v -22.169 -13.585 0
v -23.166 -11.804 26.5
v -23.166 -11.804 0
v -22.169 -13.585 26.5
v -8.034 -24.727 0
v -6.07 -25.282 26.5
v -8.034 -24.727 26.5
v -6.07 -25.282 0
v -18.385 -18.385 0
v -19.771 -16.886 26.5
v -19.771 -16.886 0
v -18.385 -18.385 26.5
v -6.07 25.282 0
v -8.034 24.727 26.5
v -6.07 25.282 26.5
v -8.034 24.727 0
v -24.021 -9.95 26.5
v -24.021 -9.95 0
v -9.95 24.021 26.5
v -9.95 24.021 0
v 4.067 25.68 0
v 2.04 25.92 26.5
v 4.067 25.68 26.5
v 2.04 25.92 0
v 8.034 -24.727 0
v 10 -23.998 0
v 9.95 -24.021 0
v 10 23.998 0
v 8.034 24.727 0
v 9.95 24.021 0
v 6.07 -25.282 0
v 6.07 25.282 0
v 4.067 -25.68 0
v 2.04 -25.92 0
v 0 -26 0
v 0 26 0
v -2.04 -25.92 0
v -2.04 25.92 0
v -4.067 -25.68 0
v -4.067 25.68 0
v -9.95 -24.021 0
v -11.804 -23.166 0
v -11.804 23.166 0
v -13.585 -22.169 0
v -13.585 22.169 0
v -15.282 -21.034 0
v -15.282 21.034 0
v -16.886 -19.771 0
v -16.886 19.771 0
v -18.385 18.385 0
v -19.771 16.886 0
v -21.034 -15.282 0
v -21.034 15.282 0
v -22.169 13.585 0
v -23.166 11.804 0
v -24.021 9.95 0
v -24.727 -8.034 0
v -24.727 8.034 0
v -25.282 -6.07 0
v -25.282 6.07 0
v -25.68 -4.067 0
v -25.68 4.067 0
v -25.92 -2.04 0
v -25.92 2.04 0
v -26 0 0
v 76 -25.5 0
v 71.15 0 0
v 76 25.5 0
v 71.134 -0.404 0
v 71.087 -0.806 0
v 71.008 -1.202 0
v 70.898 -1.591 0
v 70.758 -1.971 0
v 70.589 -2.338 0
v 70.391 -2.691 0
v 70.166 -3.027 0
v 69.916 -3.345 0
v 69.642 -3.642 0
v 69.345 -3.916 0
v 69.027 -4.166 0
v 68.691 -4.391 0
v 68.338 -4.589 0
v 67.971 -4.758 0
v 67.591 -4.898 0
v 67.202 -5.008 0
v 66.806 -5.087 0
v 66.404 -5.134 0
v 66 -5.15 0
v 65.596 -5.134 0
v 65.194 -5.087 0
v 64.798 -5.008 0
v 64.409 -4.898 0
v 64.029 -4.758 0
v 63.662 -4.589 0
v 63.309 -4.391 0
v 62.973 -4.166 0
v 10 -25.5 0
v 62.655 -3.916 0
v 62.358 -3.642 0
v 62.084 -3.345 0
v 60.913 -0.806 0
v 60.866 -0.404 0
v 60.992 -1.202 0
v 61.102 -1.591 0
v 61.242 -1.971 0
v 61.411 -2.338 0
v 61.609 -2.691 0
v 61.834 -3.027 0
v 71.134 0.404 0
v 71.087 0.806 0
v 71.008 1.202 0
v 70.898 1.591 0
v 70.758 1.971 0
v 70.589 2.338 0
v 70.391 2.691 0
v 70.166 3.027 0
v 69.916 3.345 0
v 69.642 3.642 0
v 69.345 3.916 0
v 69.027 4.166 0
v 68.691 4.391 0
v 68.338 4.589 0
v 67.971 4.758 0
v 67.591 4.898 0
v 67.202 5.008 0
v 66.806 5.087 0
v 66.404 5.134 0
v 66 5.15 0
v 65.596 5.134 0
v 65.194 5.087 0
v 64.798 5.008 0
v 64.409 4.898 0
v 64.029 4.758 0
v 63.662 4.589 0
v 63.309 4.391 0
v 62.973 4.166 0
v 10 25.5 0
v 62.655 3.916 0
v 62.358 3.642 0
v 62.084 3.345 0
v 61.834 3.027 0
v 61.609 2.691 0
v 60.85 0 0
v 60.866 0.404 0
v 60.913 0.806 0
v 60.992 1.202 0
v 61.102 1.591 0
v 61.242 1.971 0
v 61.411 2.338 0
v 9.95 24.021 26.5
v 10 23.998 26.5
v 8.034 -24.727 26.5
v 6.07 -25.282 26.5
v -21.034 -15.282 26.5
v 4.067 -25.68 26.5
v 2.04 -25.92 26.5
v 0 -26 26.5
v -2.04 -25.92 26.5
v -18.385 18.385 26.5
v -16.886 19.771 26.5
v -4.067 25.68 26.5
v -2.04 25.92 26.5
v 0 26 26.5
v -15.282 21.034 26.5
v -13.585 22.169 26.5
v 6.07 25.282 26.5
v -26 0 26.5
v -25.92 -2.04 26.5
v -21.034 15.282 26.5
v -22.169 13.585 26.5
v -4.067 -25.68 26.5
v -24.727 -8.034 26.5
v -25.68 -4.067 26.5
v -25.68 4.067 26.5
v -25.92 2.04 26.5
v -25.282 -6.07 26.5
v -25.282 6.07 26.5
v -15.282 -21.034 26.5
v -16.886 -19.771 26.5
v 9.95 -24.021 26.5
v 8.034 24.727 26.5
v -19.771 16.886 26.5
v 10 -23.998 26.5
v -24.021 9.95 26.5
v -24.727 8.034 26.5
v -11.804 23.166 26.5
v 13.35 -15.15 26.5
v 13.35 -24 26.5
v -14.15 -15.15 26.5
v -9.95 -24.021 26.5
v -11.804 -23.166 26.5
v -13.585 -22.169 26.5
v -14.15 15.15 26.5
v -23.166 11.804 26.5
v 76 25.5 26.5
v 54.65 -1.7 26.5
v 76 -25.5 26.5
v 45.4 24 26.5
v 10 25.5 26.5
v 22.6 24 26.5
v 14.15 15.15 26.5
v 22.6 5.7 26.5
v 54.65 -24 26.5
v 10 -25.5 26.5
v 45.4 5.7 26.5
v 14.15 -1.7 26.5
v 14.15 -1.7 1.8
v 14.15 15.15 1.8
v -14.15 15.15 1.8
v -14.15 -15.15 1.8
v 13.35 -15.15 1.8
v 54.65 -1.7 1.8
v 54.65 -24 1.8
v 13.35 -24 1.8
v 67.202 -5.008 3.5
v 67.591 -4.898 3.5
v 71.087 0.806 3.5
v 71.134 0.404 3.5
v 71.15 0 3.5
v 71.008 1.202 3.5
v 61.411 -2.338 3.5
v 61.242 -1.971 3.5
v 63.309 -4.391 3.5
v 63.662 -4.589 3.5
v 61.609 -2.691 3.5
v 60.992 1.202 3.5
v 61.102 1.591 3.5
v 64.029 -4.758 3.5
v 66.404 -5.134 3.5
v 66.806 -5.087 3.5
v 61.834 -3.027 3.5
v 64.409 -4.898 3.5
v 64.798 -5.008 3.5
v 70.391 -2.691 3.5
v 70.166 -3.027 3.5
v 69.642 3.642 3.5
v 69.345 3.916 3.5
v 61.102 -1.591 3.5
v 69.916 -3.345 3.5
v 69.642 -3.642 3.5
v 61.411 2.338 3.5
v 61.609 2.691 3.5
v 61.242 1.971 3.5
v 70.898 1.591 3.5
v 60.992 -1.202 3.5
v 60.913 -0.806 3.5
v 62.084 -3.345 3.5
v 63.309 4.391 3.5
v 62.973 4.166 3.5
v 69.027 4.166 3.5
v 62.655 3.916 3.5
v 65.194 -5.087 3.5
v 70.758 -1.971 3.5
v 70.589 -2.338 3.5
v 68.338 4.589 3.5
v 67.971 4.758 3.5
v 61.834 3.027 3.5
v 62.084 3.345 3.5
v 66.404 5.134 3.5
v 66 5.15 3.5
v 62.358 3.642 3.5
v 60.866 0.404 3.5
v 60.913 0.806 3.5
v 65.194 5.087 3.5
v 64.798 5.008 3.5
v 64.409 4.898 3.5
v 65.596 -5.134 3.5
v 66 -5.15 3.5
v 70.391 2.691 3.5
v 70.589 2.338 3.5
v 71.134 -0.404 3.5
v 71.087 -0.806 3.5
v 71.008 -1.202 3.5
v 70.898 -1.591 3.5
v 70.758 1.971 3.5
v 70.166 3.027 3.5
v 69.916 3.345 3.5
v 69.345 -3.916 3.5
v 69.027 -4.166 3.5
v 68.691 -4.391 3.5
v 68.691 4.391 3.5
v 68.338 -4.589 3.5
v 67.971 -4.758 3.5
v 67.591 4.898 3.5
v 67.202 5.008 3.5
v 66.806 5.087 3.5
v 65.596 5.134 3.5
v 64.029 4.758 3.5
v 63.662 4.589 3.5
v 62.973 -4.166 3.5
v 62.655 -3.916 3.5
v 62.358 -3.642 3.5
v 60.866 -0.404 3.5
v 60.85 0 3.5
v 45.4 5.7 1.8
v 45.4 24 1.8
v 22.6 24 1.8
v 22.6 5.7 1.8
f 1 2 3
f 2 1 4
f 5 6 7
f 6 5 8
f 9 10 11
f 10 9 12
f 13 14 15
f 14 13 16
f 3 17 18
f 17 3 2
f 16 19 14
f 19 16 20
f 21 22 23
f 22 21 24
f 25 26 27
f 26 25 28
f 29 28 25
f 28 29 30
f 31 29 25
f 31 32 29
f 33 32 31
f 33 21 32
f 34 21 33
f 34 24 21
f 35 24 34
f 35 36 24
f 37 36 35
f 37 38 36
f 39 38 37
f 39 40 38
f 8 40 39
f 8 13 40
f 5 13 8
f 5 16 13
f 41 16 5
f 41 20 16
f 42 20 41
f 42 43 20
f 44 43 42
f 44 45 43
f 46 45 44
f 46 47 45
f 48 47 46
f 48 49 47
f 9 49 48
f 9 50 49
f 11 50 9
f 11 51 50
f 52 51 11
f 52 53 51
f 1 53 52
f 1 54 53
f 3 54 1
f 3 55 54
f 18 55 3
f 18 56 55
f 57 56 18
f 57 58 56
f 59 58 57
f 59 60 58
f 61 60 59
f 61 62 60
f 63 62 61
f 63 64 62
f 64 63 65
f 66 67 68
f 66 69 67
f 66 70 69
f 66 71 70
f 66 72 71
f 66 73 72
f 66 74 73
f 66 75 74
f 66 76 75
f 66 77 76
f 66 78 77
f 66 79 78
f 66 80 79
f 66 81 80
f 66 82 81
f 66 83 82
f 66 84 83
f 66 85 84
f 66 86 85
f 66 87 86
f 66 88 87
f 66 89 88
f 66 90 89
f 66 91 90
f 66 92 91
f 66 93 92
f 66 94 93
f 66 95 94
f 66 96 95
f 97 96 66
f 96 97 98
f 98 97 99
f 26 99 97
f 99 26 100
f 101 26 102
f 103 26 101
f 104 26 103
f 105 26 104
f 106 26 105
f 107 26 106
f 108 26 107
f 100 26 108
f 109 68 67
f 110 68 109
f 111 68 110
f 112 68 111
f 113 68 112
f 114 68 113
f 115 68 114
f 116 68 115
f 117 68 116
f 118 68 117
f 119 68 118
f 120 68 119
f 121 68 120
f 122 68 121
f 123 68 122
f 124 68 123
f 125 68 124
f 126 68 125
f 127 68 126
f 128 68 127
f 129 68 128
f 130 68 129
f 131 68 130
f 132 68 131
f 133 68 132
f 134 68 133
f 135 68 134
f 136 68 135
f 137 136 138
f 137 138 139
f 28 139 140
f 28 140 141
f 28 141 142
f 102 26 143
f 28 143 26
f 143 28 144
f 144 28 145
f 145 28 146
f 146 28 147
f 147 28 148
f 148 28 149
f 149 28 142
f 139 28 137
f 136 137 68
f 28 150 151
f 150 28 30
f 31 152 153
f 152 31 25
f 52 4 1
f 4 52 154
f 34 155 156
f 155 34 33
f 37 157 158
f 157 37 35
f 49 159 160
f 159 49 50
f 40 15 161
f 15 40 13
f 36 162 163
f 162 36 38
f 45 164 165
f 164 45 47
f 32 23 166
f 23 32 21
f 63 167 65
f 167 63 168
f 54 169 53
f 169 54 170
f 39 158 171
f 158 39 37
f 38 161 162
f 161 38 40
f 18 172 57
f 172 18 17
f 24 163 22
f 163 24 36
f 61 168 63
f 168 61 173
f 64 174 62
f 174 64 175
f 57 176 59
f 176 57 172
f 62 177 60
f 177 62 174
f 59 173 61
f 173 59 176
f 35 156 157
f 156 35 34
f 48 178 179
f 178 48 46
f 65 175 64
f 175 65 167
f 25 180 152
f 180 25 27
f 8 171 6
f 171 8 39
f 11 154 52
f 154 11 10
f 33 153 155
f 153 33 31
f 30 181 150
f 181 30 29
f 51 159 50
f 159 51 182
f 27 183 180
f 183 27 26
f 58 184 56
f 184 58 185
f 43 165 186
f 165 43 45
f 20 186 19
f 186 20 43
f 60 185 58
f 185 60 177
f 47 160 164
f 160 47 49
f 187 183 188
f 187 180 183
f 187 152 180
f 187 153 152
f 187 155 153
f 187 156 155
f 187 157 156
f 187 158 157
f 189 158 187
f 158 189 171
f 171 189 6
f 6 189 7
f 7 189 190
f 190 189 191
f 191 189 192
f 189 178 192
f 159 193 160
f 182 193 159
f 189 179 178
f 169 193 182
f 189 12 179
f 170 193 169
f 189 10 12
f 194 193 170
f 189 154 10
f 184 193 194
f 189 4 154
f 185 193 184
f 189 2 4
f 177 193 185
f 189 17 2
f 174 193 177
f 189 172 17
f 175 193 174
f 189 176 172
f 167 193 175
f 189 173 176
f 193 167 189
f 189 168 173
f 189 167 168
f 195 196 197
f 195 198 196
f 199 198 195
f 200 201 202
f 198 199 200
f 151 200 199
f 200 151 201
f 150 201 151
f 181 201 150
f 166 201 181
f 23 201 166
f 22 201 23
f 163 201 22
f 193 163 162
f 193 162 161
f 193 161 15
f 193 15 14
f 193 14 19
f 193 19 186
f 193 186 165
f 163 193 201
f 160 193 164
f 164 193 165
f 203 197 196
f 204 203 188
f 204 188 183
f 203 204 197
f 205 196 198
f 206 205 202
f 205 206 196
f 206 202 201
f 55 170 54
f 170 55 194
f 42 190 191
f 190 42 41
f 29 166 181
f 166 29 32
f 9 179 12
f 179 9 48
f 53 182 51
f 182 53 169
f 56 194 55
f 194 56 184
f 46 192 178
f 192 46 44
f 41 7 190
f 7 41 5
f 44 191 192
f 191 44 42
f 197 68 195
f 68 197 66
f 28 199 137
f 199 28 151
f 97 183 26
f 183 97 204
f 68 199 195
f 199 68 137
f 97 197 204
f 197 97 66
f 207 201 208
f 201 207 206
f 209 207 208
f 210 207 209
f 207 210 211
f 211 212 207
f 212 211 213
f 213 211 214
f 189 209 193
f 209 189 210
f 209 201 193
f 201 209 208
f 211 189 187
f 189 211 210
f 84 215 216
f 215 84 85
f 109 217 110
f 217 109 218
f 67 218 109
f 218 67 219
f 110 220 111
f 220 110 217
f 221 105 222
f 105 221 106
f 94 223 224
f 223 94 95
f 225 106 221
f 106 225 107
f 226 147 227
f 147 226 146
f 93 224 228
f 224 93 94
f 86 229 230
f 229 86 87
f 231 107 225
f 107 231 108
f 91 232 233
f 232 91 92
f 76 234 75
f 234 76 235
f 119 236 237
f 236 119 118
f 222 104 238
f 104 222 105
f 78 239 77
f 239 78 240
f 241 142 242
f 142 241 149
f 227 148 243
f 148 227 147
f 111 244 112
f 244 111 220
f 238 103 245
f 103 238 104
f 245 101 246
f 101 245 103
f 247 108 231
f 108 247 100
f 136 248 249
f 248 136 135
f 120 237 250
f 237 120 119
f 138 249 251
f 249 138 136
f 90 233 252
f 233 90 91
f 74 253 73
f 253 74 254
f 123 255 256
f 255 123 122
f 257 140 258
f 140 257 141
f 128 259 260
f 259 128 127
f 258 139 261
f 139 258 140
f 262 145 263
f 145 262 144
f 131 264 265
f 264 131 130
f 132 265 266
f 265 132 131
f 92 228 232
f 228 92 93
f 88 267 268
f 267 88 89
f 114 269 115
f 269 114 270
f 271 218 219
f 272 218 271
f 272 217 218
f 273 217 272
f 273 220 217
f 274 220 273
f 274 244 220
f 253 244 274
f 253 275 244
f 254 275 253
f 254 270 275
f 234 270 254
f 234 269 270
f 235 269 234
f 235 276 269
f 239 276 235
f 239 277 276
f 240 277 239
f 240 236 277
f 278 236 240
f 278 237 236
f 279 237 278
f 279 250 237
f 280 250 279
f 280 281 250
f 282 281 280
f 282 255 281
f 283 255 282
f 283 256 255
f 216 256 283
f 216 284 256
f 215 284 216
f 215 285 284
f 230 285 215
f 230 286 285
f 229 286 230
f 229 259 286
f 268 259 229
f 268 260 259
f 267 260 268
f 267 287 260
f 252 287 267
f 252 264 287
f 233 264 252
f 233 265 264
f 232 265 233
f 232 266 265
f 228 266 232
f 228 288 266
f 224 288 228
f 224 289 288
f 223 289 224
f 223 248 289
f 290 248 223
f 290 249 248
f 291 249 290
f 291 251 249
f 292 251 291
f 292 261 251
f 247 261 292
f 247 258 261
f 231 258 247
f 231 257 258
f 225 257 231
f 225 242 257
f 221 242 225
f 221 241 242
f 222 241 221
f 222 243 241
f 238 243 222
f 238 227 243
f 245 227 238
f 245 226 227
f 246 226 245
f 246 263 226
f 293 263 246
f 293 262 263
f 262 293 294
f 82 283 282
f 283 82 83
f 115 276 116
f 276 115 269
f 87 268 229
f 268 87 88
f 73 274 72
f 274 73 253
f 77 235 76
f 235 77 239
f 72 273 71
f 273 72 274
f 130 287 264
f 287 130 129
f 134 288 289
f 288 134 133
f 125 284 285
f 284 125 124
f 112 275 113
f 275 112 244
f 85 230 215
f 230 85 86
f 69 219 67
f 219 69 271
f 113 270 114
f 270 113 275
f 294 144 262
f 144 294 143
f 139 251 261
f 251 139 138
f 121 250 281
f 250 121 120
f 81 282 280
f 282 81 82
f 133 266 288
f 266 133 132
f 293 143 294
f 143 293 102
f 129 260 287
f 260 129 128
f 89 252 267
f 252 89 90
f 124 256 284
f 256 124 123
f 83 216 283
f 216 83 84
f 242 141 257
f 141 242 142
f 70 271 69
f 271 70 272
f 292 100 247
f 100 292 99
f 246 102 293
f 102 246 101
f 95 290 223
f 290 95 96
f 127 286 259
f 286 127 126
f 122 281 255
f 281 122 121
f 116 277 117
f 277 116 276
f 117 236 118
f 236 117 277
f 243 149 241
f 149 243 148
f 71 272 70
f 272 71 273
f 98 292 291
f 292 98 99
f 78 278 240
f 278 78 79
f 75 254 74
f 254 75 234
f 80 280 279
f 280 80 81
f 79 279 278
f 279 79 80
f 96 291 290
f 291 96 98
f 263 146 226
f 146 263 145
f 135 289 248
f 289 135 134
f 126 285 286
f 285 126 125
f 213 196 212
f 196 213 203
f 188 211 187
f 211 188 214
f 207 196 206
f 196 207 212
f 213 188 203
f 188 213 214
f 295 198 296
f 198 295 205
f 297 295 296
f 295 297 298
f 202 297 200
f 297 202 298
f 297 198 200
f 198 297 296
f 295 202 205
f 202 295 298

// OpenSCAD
// ============================================================
//  Wrist-Puck Keyhole Enclosure — First Draft
//  Rev 1.0  |  July 2026  |  Sean (Whitehorse, YT)
//
//  Replaces the circular puck (wrist_puck_enclosure_5_0.scad) with
//  a keyhole silhouette: a round chamber (servo + arm + LRA) joined
//  to an elongated rectangular body (battery/DRV/PowerBoost stack +
//  XIAO/IMU stack), sized against Sean's actual wrist (53mm wide x
//  35mm thick where the watch sits) rather than a fixed diameter
//  that didn't fit.
//
//  Component numbers below are Sean's own measurements from this
//  session, not the earlier file's assumed values -- several
//  changed (battery is 9mm thick now, not 6mm; servo+arm sweep is
//  28x30mm, not just the 21.5x25.1mm body; PowerBoost/XIAO/IMU all
//  slightly different from the rev5 assumptions). Reused without
//  change: WALL, FLOOR_T, LID_T, CLEARANCE, CAP_T, SNAP_* from
//  wrist_puck_enclosure_5_0.scad -- no reason to re-derive numbers
//  that were already validated there.
//
//  FIRST-PASS FLAGS -- explicit, not buried in comments:
//    - RECT_W (51mm) against Sean's 53mm wrist width leaves only
//      ~1mm clearance per side. That's tight. A real dry-fit is not
//      optional here the way it was borderline-optional elsewhere.
//    - Servo pocket fits chamber inner radius with ~1mm margin --
//      also tight. If the actual arm sweep needs clearance beyond
//      the bounding rectangle, this will need revisiting.
//    - LRA position is a placement guess, not derived from a known
//      arm-sweep direction -- flagged in-line below.
//    - No snap tabs, USB-C cutout, or standoff posts yet -- this
//      draft establishes the outer silhouette and the two internal
//      cavities are load-bearing; those details are next-pass.
//    - No lid/cap yet -- bottom shell only, to get the harder shape
//      right first.
// ============================================================

// ── SHARED CONSTANTS (unchanged from wrist_puck_enclosure_5_0) ──
WALL      = 2.2;
FLOOR_T   = 2.0;
LID_T     = 1.8;
CLEARANCE = 0.3;
CAP_T     = 2.0;

$fn = 80;

// ── OUTER SILHOUETTE ─────────────────────────────────────────
// X = along the forearm (0 = chamber center, increasing toward
//     the rectangular body / strap end)
// Y = across the wrist (must stay under ~53mm total)
// Z = vertical, floor at Z=0, same convention as the circular puck

CHAMBER_D = 52;   // round chamber outer diameter -- grown from 48mm
                    // purely for servo margin/sweep comfort, not to
                    // also fit the LRA (verified: that would need
                    // 58mm+, past the 53mm wrist width entirely)
CHAMBER_R = CHAMBER_D / 2;

RECT_L = 66;    // rectangular body outer length (along arm) --
                 // extended from 48mm to fit a dedicated LRA zone at
                 // the far end (see LRA_CX/CY below), since neither
                 // the chamber nor the original rectangle had room
                 // for it once the servo was safely centered
RECT_W = 51;    // rectangular body outer width (across arm) --
                 // SEE FIRST-PASS FLAG ABOVE: tight against 53mm wrist
RECT_X0 = 10;   // where the rectangle starts, overlapping into the
                 // chamber circle for a continuous keyhole silhouette

module outer_silhouette(h) {
    union() {
        cylinder(h = h, d = CHAMBER_D);
        translate([RECT_X0, -RECT_W/2, 0])
            cube([RECT_L, RECT_W, h]);
    }
}

// ── SERVO + ARM (chamber) ────────────────────────────────────
// Sean's measured footprint: 28 x 30mm to the end of the arm swing
// (bounding box, not the bare servo body) x 12mm height.
SERVO_W = 28.0 + CLEARANCE;
SERVO_D = 30.0 + CLEARANCE;
SERVO_H = 12.0 + CLEARANCE;
// FIXED: was (-2, 4), a rough guess that put one corner of the
// servo's bounding box 25.05mm from chamber center against only
// 21.8mm of available wall -- a real breach, verified numerically
// (check_servo_clearance.scad), not caught until Sean questioned it.
// Dead-center is the only placement that clears all four corners --
// margin is 1.07mm, tight but real (verified: check_servo_centered.scad).
// Rotating the servo doesn't help on its own -- the bounding box's
// diagonal is the same regardless of which way it's rotated; only
// the CENTER position determines whether the corners clear the wall.
SERVO_CX = 0;
SERVO_CY = 0;

// ── LRA ───────────────────────────────────────────────────────
// FIRST-PASS PLACEMENT GUESS: tucked into the chamber's leftover
// crescent space, away from the servo footprint above. Needs
// verification once the servo's actual mounting orientation (which
// way the arm swings) is fixed -- it's placed clear of the servo's
// bounding box as currently assumed, not clear of the real swept
// arc if that's smaller than the bounding box suggests.
LRA_DIAM = 10.0 + CLEARANCE;
LRA_H    = 3.5;
// FIXED: was (2, -16), which collided with the servo once it was
// safely centered, and no other spot existed in either the chamber
// or the original (unextended) rectangle -- verified by numerical
// search, not assumed. Moved to a dedicated zone at the rectangle's
// far end, away from the servo, power stack, and compute stack.
// Sean confirmed physical proximity to the servo doesn't matter for
// how the haptic signal is perceived.
LRA_CX   = 66;
LRA_CY   = 0;

// ── POWER STACK (battery / DRV / PowerBoost) ─────────────────
// Stacks in Z exactly like the circular puck did -- same X/Y
// center for all three, different heights. Footprint is the
// battery's own (the largest of the three).
BATT_W = 22.0 + CLEARANCE;   // Sean's measured 22mm (incl. shim/tape)
BATT_D = 41.0 + CLEARANCE;
BATT_H = 9.0;                 // measured, incl. shim/foam/kapton tape

DRV_W = 19.0 + CLEARANCE;
DRV_D = 25.0 + CLEARANCE;
DRV_H = 4.0;

PB_W = 22.0 + CLEARANCE;
PB_D = 36.0 + CLEARANCE;      // Sean's remeasure, was 37 in rev5
PB_H = 7.5;

// FIXED: was "RECT_X0 + RECT_L/2", which re-centers on the
// rectangle's length -- meant that extending RECT_L to make room
// for the LRA zone also shifted this zone further out, colliding
// with the new LRA position. Pinned to its original, already-
// verified value (from when RECT_L was 48) so growing the rectangle
// only adds new space at the far end, rather than also moving
// existing, already-checked geometry.
PWR_CX = 34;
PWR_CY = -(RECT_W/2 - BATT_W/2 - 1.5);  // offset to one side, 1.5mm margin off the wall

// ── COMPUTE STACK (XIAO / IMU) ────────────────────────────────
// Also stacks in Z -- XIAO on the floor, IMU on top of it.
// IMU is the header-less 601N1 module: 20.6 x 17.8 x 3mm.
XIAO_W = 22.5 + CLEARANCE;
XIAO_D = 18.0 + CLEARANCE;
XIAO_H = 4.5;

IMU_W = 20.6 + CLEARANCE;
IMU_D = 17.8 + CLEARANCE;
IMU_H = 3.0;   // header-less, per Sean's measurement

CPU_CX = PWR_CX;                              // same X-center as power stack
// Y-offset must use XIAO_D (18.3mm, the across-wrist cube dimension
// below), not XIAO_W -- XIAO_W is the along-arm dimension here since
// its cube is [XIAO_W, XIAO_D, ...], long-side-on-X, same convention
// as the (now-fixed) power stack.
CPU_CY = (RECT_W/2 - XIAO_D/2 - 1.5);

// ── SHARED CAVITY MODULES ────────────────────────────────────
// Each takes cut_top_z (absolute Z height to cut up to) so both
// bottom_shell() (full height) and floorplan.scad's shallow test
// tray (via use<>, calling these same modules at a small cut_top_z)
// share the exact same XY footprint logic. No duplicated numbers,
// no variable-scoping fights -- learned the hard way that neither
// plain nor $-prefixed variable overrides survive OpenSCAD's
// duplicate-assignment resolution across an include<>, even with
// an is_undef() guard. Modules ARE importable via use<>, so this
// sidesteps the whole problem structurally instead.
module servo_cavity(cut_top_z) {
    translate([SERVO_CX, SERVO_CY, (FLOOR_T - 0.2 + cut_top_z)/2])
        cube([SERVO_W, SERVO_D, cut_top_z - (FLOOR_T - 0.2)], center = true);
}

module lra_cavity() {
    // opens through the BOTTOM, not the top -- correct as a short
    // cavity regardless of caller, no cut_top_z parameter needed
    translate([LRA_CX, LRA_CY, -0.2])
        cylinder(h = LRA_H + 0.2, d = LRA_DIAM);
}

module power_cavity(cut_top_z) {
    translate([PWR_CX, PWR_CY, (FLOOR_T - 0.2 + cut_top_z)/2])
        cube([BATT_D, BATT_W, cut_top_z - (FLOOR_T - 0.2)], center = true);
}

module compute_cavity(cut_top_z) {
    translate([CPU_CX, CPU_CY, (FLOOR_T - 0.2 + cut_top_z)/2])
        cube([XIAO_W, XIAO_D, cut_top_z - (FLOOR_T - 0.2)], center = true);
}

// ── BOTTOM SHELL ───────────────────────────────────────────────
module bottom_shell() {
    // Shell height must clear the TALLEST cavity, not just the
    // servo -- the power stack (battery+DRV+PowerBoost, 20.5mm) is
    // taller than the servo pocket (12.3mm). Missed this on the
    // first pass through this file; caught before rendering, not
    // after.
    power_stack_h = BATT_H + DRV_H + PB_H;
    tallest = max(SERVO_H, power_stack_h, XIAO_H + IMU_H);
    shell_h = FLOOR_T + tallest + 4;   // 4mm margin for lid/wall clearance

    difference() {
        outer_silhouette(shell_h);

        // All three cavities must reach the TOP of the shell (open,
        // not a sealed void) -- components need to go in from above,
        // and a lid (not yet built) will close over the top later.
        // The real bug on earlier passes: each cavity only extended to
        // its OWN component height + a small overshoot, which fell
        // well short of shell_h. Every cavity was therefore a fully
        // enclosed void, sealed on all sides -- no way to insert a
        // battery into a bubble with no opening. Fixed by overshooting
        // every cavity's top past shell_h, via cut_top_z = shell_h+1.
        servo_cavity(shell_h + 1);
        lra_cavity();
        power_cavity(shell_h + 1);
        compute_cavity(shell_h + 1);
    }
}

bottom_shell();
